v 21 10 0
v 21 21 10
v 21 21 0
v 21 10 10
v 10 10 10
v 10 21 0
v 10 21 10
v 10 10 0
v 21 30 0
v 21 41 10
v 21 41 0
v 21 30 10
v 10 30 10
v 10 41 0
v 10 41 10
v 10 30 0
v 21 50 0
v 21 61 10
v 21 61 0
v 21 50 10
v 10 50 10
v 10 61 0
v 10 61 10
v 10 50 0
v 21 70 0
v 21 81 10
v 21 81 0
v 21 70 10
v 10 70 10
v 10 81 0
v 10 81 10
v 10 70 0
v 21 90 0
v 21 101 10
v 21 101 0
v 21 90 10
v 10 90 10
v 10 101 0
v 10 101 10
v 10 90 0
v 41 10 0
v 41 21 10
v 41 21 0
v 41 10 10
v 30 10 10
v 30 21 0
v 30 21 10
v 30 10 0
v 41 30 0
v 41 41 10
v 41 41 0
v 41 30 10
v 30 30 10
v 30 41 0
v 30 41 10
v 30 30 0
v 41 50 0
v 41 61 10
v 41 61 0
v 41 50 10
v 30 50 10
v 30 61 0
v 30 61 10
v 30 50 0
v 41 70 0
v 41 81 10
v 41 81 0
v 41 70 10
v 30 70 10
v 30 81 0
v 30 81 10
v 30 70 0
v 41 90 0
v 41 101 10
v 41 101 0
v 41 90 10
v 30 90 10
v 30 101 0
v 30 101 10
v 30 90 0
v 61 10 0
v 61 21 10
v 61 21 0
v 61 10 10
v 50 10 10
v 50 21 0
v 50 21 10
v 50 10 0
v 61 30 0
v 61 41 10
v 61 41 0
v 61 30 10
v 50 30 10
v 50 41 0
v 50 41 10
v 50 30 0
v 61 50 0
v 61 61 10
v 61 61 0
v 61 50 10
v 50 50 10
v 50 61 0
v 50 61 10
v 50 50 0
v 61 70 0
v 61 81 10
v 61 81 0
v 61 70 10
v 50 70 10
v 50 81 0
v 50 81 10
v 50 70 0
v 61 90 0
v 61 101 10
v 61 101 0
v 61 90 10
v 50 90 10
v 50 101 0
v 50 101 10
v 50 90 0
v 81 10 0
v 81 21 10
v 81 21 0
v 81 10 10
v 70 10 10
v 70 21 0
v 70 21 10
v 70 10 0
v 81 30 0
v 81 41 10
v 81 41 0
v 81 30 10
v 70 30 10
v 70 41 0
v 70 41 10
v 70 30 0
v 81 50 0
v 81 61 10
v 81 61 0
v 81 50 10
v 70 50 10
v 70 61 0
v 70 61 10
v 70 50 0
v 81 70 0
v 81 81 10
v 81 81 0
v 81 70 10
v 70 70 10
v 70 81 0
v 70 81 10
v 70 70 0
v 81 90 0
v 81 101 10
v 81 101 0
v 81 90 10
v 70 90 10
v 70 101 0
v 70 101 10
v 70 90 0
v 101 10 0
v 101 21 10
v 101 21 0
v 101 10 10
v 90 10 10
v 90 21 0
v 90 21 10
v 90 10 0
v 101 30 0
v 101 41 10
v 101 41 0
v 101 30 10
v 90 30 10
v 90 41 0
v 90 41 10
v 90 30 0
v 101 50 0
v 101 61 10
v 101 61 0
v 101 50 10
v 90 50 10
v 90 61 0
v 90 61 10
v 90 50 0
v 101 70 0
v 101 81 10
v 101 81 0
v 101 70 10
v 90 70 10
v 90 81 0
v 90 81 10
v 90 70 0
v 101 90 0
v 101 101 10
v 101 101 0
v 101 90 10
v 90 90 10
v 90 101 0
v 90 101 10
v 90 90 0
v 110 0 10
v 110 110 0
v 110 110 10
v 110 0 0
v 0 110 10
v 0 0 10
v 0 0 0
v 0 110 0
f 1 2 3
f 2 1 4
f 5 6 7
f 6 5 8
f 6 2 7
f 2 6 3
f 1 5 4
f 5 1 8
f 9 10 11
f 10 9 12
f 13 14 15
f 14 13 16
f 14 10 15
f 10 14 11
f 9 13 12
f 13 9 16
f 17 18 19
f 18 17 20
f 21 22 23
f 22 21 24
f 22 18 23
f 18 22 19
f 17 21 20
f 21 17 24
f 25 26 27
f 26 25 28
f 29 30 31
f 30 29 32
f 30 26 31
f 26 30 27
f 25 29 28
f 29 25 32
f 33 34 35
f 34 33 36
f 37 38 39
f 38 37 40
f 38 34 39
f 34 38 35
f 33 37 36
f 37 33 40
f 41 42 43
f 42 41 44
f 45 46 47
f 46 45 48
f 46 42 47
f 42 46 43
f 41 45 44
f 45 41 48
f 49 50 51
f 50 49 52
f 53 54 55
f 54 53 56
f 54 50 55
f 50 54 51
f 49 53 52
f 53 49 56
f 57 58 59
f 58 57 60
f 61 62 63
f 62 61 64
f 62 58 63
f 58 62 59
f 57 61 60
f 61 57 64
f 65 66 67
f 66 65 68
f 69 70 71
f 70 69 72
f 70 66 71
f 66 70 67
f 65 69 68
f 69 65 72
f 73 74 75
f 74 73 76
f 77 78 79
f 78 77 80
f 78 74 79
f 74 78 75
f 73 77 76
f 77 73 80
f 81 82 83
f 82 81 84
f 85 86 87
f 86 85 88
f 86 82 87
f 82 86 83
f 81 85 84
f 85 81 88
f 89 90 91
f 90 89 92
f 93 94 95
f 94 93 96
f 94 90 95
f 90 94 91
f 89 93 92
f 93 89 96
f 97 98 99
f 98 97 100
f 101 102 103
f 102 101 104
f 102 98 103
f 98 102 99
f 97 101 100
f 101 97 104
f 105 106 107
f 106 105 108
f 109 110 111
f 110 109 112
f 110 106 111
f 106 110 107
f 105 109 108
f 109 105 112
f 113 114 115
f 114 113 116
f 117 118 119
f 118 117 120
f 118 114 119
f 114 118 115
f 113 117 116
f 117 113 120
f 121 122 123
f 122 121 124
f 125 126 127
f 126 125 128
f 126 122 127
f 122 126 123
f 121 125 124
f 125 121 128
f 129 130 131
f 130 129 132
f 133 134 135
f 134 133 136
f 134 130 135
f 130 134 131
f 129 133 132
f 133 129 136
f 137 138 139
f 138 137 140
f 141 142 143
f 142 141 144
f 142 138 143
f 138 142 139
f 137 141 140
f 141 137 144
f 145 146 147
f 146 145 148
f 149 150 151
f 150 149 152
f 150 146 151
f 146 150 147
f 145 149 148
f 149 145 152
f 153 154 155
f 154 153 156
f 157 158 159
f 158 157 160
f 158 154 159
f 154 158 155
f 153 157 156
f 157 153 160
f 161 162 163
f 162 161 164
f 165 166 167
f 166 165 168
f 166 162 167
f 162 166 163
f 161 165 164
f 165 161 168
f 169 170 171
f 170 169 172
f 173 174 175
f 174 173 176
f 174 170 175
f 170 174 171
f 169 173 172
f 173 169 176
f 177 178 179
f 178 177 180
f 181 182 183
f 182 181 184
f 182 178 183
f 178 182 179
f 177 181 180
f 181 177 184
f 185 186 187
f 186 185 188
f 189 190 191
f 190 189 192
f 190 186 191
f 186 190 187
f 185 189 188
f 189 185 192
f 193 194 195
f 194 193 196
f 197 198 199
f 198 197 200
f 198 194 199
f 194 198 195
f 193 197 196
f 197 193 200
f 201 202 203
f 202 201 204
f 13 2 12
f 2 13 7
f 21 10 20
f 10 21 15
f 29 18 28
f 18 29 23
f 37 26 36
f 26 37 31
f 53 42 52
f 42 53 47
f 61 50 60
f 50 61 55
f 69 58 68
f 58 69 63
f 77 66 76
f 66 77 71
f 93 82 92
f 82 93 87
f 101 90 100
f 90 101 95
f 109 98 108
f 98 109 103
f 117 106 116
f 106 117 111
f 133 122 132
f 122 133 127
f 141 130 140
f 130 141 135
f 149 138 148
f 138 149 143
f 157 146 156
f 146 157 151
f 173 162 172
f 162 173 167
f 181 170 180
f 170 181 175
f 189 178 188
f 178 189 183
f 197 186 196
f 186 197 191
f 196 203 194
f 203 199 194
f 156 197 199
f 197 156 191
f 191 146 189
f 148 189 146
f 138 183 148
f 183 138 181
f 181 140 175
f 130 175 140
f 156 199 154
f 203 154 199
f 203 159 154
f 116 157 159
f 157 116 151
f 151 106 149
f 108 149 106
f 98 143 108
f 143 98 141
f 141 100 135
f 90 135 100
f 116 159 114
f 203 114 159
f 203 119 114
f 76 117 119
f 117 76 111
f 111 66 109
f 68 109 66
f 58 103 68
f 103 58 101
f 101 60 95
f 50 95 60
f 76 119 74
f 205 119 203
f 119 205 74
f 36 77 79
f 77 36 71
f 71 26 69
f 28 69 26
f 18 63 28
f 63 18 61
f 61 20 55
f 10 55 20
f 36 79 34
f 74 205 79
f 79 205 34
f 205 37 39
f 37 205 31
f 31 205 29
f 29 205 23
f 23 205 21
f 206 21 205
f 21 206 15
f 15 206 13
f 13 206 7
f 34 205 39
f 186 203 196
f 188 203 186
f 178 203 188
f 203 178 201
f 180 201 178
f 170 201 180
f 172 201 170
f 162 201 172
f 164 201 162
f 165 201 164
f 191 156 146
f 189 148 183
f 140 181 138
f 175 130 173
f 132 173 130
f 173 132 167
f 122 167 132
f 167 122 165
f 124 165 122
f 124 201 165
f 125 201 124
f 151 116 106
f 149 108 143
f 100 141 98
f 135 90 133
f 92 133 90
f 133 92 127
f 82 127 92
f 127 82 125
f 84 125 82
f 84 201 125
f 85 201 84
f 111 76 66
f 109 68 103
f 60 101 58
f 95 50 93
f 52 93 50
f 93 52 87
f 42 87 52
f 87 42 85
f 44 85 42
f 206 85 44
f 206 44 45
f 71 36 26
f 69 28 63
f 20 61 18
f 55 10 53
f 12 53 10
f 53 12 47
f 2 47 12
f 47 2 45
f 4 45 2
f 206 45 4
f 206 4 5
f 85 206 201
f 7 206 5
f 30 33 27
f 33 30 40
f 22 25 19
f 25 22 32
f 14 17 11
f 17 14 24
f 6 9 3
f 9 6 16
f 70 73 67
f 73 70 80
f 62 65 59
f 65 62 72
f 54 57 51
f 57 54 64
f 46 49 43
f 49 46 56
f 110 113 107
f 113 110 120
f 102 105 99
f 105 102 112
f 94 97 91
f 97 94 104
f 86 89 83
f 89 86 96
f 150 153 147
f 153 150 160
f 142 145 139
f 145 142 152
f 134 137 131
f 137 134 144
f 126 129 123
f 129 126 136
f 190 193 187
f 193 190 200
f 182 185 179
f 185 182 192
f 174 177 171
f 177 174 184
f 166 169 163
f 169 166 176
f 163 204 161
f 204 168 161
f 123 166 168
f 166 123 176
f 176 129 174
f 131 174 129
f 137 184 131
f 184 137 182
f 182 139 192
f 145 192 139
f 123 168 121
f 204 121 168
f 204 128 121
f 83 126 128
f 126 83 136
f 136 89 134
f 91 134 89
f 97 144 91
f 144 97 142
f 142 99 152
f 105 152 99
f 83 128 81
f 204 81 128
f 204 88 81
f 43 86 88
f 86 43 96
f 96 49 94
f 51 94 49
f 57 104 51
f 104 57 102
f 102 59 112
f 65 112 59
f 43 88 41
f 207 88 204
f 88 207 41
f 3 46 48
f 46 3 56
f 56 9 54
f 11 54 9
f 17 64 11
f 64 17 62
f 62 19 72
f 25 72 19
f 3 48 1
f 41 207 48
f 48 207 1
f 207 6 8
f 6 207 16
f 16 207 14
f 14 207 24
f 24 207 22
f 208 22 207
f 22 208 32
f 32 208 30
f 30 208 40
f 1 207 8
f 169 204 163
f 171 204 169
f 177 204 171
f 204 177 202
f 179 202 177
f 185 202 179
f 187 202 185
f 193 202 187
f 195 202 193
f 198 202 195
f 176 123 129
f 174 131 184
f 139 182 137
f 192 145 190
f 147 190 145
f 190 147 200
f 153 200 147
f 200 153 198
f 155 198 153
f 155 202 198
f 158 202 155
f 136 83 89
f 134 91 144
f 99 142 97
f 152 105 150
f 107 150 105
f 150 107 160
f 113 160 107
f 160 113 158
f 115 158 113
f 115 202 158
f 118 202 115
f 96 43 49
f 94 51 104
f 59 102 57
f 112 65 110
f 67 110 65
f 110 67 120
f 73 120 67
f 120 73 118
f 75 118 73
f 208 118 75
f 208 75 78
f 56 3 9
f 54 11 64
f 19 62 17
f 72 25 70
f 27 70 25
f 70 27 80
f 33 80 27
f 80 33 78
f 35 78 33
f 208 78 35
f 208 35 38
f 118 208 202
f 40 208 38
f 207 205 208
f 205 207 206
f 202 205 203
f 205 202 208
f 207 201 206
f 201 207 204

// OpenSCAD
x1=110;
y1=110;
z=10;


tol=0.2;

 difference(){
   cube([x1,y1,z]);
   for (x=[10:20:90]){
     for (y=[10:20:90]){
       translate([x,y,-tol/2]){
         cube(11);
       }
     }
   }
 }
